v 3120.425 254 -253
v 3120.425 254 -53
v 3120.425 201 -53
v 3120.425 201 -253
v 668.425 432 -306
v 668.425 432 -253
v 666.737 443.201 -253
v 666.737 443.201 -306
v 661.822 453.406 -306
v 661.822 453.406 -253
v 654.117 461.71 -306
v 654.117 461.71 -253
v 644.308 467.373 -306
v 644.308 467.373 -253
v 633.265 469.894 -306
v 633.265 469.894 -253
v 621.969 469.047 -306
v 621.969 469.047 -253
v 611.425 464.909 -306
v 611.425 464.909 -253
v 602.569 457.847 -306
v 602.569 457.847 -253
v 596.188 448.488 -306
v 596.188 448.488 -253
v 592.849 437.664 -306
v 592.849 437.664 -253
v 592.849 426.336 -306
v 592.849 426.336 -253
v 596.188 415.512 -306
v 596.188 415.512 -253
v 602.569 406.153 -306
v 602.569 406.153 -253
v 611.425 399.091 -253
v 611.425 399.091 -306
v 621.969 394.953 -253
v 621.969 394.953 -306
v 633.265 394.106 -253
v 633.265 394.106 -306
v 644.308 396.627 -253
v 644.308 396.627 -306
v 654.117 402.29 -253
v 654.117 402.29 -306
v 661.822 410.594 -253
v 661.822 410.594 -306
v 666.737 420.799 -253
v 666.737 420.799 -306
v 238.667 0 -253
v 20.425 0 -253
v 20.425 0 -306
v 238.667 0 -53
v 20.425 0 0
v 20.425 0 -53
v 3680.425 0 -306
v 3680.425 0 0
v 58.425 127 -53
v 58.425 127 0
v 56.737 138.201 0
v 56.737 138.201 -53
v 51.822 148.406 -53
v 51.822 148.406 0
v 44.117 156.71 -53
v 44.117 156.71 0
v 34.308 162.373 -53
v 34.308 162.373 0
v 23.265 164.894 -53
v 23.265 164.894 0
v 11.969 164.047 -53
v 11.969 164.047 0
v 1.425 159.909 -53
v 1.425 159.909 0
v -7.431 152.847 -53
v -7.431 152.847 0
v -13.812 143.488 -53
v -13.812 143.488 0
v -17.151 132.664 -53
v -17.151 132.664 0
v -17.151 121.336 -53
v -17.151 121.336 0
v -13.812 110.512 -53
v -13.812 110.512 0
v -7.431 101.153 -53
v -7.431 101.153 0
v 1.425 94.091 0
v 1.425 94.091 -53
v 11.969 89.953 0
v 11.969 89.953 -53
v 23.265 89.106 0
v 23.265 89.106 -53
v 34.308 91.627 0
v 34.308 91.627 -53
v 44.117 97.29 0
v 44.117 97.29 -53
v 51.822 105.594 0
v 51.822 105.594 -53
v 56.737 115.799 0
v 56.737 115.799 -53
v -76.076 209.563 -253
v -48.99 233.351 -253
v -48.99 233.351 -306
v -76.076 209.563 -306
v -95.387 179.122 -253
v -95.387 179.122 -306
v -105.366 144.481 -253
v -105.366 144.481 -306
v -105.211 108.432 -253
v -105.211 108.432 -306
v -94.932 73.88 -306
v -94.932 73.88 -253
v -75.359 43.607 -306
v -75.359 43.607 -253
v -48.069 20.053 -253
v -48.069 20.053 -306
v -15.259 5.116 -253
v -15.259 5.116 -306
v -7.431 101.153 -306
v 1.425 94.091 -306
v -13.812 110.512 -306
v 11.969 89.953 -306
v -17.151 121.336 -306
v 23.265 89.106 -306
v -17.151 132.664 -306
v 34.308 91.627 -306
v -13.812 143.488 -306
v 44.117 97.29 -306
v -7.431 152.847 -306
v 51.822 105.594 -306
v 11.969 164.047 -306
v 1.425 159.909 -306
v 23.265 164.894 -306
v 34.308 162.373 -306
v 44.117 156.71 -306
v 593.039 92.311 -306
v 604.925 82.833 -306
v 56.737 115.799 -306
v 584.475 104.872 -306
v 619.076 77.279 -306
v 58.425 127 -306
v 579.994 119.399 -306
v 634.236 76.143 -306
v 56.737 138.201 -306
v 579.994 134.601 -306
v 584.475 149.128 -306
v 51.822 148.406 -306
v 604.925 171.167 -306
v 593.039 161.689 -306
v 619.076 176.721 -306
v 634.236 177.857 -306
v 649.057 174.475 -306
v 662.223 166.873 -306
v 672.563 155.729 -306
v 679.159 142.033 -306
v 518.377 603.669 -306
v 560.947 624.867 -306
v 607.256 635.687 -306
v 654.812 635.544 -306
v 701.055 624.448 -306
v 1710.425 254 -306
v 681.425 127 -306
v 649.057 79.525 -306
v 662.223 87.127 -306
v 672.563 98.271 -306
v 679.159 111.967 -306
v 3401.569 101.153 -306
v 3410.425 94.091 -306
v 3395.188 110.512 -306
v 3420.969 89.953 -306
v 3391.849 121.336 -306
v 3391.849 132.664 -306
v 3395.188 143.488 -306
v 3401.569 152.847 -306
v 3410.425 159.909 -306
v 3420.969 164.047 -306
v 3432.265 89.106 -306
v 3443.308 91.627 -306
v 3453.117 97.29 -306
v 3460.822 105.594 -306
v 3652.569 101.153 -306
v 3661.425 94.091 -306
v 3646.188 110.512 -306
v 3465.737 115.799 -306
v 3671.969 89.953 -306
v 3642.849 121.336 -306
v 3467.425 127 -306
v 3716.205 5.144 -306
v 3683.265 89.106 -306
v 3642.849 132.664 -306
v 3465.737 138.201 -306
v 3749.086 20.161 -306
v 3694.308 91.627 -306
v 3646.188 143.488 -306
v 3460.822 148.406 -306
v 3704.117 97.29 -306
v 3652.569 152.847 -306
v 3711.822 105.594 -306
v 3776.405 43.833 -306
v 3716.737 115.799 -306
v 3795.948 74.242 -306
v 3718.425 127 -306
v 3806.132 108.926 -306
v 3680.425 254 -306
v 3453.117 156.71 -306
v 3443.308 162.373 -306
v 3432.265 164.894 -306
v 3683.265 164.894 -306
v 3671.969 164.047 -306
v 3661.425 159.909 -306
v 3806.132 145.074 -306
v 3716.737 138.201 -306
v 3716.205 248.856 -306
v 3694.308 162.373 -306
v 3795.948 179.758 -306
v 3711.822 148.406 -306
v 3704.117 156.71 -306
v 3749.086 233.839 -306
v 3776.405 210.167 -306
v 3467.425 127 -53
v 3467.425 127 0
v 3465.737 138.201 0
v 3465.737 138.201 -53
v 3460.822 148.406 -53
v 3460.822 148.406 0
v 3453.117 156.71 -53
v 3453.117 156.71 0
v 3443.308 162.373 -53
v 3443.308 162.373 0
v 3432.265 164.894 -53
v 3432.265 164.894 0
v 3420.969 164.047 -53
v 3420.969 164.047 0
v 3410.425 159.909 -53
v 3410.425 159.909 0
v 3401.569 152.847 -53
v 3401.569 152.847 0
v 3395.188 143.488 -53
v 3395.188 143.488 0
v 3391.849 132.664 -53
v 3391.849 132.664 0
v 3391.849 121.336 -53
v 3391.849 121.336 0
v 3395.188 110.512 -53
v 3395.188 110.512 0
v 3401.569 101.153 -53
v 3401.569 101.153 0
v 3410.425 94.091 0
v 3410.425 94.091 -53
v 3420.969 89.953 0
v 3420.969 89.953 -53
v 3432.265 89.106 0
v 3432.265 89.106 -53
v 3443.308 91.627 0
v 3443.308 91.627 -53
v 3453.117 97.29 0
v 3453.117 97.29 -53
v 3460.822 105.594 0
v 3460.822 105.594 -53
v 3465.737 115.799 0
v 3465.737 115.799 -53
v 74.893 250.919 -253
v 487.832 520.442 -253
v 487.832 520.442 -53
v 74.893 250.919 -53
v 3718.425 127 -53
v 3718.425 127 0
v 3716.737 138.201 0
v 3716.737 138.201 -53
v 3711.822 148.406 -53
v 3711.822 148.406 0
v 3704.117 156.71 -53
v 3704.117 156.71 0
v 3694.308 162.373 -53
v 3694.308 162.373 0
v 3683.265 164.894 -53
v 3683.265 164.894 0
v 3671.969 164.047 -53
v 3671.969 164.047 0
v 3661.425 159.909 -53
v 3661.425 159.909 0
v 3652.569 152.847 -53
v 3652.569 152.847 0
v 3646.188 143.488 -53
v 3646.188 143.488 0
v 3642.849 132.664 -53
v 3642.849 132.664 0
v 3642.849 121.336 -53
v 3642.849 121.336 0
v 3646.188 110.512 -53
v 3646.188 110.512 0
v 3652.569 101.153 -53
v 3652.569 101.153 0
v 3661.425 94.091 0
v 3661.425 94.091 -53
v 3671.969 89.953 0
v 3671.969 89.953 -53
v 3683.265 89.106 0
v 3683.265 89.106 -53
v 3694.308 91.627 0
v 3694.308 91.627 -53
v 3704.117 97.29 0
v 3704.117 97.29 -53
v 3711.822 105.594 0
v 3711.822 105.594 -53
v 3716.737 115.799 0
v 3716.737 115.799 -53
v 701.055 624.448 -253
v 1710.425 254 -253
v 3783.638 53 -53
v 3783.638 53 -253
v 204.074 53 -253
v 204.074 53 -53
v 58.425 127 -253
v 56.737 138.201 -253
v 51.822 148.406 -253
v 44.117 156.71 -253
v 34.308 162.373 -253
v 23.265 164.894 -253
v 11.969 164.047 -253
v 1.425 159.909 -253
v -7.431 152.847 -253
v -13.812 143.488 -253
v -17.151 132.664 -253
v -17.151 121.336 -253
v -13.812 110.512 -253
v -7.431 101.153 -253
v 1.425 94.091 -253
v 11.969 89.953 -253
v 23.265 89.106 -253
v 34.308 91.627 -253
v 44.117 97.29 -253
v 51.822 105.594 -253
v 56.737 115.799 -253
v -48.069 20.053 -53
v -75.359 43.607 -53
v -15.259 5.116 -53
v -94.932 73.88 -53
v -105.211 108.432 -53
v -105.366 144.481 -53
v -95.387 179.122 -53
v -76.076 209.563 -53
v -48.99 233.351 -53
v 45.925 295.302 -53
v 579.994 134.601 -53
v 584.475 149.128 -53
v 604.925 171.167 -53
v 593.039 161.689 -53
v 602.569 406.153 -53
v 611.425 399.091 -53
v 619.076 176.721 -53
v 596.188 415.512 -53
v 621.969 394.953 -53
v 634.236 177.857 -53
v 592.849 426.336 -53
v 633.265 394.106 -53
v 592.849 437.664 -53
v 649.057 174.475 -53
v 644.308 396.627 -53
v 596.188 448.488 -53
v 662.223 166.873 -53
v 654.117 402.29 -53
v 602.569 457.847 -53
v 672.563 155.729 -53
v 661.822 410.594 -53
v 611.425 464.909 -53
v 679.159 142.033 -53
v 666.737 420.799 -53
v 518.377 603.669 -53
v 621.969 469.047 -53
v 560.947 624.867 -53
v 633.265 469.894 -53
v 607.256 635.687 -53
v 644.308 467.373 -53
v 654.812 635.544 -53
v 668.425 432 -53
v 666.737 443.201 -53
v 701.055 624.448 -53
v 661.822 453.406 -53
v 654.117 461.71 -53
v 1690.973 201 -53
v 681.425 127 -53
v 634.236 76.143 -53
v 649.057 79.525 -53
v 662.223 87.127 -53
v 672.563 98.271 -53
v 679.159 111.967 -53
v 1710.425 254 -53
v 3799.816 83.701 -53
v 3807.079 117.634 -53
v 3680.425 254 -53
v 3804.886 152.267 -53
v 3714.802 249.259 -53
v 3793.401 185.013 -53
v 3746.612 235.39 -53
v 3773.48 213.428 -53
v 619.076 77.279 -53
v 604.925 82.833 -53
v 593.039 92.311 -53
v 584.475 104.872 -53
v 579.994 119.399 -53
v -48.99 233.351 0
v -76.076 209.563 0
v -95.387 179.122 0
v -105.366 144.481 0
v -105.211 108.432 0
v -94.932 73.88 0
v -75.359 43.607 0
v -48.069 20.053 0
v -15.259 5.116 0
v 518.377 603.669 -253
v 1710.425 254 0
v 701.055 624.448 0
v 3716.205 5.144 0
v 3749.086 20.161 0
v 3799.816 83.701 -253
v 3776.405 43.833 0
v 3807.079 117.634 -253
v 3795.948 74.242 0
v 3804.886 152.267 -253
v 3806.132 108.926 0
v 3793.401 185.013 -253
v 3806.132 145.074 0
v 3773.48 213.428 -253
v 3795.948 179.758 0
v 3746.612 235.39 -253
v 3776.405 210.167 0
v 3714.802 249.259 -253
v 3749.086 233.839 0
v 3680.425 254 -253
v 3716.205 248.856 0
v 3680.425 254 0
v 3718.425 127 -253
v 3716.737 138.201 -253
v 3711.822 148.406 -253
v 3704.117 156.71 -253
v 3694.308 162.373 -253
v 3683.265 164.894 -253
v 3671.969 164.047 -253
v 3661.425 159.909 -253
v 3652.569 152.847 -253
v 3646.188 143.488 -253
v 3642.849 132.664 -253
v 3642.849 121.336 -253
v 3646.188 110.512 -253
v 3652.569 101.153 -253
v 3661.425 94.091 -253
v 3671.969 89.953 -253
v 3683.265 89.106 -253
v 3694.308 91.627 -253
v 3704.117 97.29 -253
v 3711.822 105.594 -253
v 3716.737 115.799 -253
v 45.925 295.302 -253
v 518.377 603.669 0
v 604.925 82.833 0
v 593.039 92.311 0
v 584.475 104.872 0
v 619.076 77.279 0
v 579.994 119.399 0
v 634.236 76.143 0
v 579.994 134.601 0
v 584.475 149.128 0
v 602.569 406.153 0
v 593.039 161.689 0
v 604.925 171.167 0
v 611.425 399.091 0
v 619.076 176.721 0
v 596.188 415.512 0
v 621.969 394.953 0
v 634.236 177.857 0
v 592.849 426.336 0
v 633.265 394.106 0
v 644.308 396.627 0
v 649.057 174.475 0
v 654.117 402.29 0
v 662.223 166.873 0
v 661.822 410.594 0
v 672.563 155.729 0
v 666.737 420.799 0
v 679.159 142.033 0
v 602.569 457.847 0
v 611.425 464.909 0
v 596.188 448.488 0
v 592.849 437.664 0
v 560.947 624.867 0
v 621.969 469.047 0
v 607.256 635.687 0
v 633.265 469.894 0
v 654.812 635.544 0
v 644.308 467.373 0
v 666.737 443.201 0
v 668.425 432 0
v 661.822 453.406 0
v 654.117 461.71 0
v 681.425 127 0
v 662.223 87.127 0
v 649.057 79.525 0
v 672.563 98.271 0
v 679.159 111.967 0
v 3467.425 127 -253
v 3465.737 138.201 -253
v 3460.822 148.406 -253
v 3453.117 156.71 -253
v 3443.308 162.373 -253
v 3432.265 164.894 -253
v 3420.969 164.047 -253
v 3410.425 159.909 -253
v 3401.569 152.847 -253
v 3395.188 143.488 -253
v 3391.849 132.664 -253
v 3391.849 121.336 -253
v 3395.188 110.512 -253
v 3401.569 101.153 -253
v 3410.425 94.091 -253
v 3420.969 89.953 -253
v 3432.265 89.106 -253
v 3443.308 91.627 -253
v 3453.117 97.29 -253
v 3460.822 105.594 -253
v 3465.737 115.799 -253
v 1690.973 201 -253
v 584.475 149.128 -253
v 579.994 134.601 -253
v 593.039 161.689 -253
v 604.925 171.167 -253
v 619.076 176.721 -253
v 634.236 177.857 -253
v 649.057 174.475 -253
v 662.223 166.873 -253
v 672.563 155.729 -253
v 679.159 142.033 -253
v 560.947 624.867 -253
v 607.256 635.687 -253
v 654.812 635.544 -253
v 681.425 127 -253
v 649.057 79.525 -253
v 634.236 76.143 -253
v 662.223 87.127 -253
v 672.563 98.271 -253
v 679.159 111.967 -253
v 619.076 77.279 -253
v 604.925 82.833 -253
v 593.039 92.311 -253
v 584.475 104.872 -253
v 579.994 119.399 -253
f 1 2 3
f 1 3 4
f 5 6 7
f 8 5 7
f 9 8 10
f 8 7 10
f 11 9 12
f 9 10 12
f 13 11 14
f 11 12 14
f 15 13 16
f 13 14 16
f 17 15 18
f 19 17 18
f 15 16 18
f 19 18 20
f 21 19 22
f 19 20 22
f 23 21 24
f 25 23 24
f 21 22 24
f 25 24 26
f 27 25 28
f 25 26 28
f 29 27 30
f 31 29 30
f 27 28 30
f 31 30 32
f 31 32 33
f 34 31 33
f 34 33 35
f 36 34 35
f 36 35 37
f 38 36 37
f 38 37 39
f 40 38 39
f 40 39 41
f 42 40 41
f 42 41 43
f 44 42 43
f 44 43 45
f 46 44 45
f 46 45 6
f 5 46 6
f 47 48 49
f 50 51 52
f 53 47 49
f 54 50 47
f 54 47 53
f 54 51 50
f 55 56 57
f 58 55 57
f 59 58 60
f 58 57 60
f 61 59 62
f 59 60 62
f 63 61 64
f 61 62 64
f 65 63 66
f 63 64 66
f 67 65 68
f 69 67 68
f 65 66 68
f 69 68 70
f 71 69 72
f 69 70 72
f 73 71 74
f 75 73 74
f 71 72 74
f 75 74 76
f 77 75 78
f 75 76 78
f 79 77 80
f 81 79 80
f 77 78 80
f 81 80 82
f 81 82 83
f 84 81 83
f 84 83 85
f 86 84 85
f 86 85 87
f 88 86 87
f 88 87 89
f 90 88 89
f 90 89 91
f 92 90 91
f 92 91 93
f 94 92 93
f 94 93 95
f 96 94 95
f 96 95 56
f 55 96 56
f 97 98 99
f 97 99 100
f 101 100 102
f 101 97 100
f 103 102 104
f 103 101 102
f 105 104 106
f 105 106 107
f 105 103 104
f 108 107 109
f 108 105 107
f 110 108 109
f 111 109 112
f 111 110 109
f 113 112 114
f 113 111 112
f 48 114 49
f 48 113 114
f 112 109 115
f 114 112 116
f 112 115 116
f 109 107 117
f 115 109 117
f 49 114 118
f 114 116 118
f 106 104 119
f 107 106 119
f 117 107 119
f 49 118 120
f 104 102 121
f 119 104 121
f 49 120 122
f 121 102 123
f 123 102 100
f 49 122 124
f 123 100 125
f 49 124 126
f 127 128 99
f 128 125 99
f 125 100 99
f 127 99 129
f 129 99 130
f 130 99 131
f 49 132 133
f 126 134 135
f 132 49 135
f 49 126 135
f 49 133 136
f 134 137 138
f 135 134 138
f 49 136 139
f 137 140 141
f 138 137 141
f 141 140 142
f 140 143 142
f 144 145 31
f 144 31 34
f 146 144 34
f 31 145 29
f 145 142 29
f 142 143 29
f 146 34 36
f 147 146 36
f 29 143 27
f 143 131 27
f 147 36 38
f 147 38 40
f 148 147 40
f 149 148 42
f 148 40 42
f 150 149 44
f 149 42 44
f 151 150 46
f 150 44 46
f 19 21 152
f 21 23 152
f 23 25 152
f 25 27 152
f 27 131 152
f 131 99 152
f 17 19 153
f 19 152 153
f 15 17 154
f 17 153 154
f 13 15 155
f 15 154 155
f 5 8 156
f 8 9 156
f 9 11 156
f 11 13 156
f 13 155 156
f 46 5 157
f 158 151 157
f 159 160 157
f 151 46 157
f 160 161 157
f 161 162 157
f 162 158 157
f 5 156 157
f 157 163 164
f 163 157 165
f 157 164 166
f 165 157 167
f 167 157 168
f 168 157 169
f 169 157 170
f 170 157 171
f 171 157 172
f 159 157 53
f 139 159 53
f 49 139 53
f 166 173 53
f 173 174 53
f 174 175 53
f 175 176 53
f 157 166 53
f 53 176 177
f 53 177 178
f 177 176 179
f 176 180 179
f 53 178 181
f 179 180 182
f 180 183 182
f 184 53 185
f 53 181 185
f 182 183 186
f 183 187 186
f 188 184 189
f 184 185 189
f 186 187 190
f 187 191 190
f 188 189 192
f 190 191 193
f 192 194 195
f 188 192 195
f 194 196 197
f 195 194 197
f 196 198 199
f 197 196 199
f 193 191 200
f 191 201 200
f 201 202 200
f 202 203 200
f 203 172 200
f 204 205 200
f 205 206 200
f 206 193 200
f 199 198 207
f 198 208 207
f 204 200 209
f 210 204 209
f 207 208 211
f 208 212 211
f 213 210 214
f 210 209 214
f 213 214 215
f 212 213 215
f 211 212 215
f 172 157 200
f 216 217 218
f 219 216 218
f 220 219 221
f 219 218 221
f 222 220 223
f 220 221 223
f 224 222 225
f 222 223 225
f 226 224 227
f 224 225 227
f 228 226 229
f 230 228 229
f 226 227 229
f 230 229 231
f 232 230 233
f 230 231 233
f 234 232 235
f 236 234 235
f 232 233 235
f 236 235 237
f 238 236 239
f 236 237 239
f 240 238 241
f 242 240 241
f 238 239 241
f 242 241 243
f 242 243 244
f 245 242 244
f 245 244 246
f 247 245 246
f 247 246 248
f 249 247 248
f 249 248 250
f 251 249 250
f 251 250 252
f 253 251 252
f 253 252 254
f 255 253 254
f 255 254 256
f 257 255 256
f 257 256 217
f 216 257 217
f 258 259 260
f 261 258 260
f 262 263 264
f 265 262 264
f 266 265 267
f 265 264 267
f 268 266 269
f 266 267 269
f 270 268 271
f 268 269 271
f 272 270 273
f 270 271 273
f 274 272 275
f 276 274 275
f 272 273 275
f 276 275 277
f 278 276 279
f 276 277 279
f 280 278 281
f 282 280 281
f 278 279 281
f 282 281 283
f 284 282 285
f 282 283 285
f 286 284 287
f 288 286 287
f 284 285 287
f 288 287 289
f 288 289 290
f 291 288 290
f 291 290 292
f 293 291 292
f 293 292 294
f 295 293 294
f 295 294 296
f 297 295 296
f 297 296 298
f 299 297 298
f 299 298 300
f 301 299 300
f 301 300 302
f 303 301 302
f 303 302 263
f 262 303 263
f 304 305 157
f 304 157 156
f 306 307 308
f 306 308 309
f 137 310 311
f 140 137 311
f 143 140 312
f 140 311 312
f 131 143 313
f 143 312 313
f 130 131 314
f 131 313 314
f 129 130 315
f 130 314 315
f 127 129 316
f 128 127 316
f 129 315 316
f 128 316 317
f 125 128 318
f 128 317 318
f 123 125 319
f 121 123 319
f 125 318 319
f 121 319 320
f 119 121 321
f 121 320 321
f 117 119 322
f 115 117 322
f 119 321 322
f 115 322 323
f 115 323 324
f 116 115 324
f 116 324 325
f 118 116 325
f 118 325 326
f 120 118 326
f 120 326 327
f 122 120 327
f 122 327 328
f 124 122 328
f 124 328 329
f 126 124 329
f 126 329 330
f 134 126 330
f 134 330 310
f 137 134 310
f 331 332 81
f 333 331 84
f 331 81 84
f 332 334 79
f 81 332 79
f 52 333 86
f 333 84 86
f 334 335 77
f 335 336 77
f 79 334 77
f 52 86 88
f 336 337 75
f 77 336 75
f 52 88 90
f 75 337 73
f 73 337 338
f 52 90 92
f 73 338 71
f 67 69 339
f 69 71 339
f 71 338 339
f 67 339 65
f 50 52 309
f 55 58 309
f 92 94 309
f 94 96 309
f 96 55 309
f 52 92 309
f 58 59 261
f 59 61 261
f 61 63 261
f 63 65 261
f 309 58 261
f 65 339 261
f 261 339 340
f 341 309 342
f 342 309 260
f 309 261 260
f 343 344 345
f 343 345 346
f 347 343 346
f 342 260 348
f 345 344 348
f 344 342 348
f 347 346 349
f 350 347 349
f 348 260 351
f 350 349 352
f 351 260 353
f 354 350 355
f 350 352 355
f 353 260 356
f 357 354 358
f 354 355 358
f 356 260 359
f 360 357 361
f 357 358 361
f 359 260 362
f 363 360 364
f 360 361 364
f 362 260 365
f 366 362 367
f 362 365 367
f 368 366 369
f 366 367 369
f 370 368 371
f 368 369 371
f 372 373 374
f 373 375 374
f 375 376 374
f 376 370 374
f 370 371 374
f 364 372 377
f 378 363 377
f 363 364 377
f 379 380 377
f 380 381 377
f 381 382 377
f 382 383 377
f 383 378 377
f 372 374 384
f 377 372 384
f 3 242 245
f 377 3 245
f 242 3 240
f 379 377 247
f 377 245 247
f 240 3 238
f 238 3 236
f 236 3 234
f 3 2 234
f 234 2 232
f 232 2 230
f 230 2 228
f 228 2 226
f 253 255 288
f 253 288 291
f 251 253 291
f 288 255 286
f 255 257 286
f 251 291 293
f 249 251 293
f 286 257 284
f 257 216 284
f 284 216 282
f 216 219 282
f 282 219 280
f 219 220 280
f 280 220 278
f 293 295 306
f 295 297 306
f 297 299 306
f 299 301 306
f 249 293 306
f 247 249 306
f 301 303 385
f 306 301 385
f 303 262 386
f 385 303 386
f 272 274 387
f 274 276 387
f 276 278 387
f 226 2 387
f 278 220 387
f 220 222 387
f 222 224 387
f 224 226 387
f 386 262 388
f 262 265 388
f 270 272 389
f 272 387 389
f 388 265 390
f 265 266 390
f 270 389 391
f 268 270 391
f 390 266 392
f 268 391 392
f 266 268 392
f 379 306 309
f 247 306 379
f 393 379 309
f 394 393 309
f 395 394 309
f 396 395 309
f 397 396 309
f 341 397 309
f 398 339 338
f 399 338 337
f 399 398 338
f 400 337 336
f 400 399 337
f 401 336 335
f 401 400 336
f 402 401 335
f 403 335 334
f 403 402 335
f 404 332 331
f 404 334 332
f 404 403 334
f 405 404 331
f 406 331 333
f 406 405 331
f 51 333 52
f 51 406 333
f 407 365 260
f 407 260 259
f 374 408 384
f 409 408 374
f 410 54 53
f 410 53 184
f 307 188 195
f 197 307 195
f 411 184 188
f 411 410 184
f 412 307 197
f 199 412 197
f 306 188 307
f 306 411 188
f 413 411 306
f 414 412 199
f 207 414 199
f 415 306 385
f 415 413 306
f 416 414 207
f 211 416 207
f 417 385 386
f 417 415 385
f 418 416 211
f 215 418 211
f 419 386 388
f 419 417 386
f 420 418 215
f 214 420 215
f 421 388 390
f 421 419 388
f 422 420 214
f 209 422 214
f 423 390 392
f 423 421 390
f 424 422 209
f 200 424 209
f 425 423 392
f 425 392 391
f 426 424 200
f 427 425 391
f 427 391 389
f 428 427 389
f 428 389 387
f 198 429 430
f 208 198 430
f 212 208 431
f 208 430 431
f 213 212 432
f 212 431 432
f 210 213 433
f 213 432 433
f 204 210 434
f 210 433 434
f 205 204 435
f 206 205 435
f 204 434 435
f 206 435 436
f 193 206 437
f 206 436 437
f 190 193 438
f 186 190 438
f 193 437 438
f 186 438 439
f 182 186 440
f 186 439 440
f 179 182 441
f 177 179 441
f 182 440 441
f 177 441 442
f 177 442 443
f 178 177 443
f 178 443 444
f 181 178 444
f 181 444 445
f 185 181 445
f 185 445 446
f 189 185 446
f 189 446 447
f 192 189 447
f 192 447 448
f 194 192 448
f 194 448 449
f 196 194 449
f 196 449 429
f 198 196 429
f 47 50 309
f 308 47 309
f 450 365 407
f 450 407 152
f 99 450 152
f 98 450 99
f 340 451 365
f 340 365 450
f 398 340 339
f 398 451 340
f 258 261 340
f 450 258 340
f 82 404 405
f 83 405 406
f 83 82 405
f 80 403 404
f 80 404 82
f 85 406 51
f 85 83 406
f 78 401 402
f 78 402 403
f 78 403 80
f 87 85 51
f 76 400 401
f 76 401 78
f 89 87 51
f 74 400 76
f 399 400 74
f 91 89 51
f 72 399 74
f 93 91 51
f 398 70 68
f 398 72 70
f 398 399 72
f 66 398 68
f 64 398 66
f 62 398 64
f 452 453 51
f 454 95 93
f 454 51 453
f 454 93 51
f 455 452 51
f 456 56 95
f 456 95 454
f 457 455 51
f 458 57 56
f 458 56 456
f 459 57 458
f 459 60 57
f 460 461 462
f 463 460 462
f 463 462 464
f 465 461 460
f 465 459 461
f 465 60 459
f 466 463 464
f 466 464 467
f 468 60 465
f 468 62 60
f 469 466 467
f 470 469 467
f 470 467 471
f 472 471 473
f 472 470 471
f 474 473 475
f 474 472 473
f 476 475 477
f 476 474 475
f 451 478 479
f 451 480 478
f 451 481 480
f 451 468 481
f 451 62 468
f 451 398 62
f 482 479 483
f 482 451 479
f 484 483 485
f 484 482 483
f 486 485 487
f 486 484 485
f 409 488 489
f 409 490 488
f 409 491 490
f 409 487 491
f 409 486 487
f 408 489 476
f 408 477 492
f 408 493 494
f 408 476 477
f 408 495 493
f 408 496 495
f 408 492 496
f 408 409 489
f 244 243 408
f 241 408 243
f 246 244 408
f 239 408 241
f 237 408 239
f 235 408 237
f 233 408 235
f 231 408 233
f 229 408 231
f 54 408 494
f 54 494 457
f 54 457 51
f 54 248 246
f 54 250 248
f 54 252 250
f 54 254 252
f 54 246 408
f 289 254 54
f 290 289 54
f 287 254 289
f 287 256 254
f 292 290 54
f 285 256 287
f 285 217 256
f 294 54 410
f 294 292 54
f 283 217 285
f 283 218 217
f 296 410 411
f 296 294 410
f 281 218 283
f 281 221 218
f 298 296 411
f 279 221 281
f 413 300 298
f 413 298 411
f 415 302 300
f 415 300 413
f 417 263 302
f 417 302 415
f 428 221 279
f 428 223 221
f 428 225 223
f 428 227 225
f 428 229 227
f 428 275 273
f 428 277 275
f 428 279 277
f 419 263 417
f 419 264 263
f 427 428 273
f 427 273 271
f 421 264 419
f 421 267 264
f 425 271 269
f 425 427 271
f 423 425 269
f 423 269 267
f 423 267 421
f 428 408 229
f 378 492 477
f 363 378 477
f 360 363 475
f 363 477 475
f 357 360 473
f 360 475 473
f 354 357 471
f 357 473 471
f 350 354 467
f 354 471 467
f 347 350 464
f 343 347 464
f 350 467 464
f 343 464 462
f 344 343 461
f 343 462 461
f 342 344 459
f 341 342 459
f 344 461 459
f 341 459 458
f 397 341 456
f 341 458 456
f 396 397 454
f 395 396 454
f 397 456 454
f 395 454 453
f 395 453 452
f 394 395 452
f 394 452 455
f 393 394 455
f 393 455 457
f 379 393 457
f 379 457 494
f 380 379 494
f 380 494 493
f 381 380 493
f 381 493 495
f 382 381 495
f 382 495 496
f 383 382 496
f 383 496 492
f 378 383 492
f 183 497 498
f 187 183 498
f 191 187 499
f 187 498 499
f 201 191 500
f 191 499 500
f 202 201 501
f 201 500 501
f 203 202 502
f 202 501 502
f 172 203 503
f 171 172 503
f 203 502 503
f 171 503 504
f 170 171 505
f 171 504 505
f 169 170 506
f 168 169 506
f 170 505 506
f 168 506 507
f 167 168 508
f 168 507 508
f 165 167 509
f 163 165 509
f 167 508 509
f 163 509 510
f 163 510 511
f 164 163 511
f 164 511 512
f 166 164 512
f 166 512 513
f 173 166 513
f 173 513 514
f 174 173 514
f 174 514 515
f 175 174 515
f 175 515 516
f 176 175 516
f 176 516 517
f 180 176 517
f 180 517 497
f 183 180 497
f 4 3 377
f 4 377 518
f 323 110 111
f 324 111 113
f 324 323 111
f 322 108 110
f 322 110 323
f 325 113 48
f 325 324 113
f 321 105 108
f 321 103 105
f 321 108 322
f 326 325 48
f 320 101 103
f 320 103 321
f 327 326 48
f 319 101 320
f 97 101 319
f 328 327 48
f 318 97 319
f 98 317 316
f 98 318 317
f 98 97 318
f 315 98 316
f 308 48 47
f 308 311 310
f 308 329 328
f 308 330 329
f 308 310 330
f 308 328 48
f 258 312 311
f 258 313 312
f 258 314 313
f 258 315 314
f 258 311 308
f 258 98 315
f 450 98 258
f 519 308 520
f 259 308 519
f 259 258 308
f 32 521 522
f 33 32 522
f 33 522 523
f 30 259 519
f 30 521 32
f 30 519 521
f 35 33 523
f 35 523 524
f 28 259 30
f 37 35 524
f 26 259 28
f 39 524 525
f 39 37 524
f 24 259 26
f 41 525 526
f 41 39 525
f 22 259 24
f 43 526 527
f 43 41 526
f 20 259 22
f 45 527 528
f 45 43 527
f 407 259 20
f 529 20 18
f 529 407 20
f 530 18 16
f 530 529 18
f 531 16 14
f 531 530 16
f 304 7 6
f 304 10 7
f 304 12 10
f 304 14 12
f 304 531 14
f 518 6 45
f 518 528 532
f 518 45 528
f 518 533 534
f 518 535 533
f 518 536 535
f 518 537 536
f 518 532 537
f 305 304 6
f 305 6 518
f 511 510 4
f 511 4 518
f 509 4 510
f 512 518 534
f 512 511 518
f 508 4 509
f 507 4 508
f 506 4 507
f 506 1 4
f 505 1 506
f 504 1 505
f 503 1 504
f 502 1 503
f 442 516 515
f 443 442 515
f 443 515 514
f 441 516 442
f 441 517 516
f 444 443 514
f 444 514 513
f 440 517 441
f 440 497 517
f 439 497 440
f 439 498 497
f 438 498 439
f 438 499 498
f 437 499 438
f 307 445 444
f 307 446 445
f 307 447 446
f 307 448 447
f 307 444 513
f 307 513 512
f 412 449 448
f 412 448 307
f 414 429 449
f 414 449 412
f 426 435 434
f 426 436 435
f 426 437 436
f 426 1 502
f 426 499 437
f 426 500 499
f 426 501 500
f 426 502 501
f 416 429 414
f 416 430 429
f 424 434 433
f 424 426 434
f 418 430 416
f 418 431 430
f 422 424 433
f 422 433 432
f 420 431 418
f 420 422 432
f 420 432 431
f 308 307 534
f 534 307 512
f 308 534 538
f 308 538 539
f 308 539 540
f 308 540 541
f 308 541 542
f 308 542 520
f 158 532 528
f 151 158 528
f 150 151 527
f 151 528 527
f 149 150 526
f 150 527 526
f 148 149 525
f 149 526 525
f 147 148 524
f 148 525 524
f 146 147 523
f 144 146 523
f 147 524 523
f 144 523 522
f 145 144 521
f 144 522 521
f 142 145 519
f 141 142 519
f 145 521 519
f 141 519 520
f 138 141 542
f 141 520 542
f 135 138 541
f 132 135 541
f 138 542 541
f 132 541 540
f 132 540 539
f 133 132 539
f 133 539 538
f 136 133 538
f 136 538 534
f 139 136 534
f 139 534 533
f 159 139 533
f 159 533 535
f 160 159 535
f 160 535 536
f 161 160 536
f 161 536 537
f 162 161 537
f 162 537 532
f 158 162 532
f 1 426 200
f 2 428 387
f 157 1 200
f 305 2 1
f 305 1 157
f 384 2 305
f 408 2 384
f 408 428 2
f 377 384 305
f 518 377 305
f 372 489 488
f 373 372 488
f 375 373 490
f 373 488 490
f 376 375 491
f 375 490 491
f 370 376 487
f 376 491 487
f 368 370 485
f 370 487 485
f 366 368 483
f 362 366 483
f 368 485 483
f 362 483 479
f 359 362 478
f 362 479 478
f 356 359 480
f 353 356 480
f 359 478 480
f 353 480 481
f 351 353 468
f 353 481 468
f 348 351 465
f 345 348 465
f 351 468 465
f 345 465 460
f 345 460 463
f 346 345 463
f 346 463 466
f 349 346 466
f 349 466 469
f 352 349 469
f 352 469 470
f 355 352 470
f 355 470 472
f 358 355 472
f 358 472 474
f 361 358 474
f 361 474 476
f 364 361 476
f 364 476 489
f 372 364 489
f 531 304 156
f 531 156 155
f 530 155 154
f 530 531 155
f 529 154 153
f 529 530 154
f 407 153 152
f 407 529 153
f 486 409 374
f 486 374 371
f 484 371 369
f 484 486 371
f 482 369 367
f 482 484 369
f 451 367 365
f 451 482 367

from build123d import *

# Parameters (mm, degrees)
SKETCH1_R           = 38
SKETCH1_R_2         = 51
BOSS_EXTRUDE1_DEPTH = 306
SKETCH8_W           = 1075.201841516
SKETCH8_H           = 200
SKETCH8_W_2         = 164.33390396
CUT_EXTRUDE5_DEPTH  = 3620.888611426
SKETCH2_W           = 560
SKETCH2_H           = 200
SKETCH2_W_2         = 127
CUT_EXTRUDE10_DEPTH = 201
SKETCH15_W          = 200
SKETCH15_H          = 148
CUT_EXTRUDE11_DEPTH = 3304.473020928
CUT_EXTRUDE12_START = -53
SKETCH16_R          = 38
CUT_EXTRUDE12_DEPTH = 200
SKETCH18_W          = 200
SKETCH18_H          = 203.424864611
CUT_EXTRUDE13_DEPTH = 3691.825090025


with BuildPart() as part:
    # Sketch1 → Boss-Extrude1 (new body)
    with BuildSketch(Plane.XY):
        with BuildLine():
            Line((20.424857609, 0), (3680.424857609, 0))
            ThreePointArc((3680.424857609, 0), (3807.424857609, 127), (3680.424857609, 254))
            Line((3680.424857609, 254), (1710.424857609, 254))
            Line((1710.424857609, 254), (701.055226762, 624.448307224))
            ThreePointArc((701.055226762, 624.448307224), (607.25608652, 635.686543606), (518.377147917, 603.669189876))
            Line((518.377147917, 603.669189876), (-48.990064981, 233.351156655))
            ThreePointArc((-48.990064981, 233.351156655), (-101.303522186, 90.789482848), (20.424857609, 0))
        make_face()
        with Locations((20.424857609, 127)):
            Circle(SKETCH1_R, mode=Mode.SUBTRACT)
        with Locations((630.424857609, 127)):
            Circle(SKETCH1_R_2, mode=Mode.SUBTRACT)
        with Locations((630.424857609, 432)):
            Circle(SKETCH1_R, mode=Mode.SUBTRACT)
        with Locations((3680.424857609, 127)):
            Circle(SKETCH1_R, mode=Mode.SUBTRACT)
        with Locations((3429.424857609, 127)):
            Circle(SKETCH1_R, mode=Mode.SUBTRACT)
    extrude(amount=-BOSS_EXTRUDE1_DEPTH)

    # Sketch8 → Cut-Extrude5 (cut, through all)
    with BuildSketch(Plane(origin=(285.193429172, 777.073563867, 0), x_dir=(0.9387722303591257, -0.3445383861147445, 0), z_dir=(0.3445383861147445, 0.9387722303591257, 0))):
        with Locations((980.585687608, 153)):
            Rectangle(SKETCH8_W, SKETCH8_H)
        with Locations((360.81781487, 153)):
            Rectangle(SKETCH8_W_2, SKETCH8_H)
    extrude(amount=-CUT_EXTRUDE5_DEPTH, mode=Mode.SUBTRACT)

    # Sketch2 → Cut-Extrude10 (cut)
    with BuildSketch(Plane(origin=(0, 254, 0), x_dir=(1, 0, 0), z_dir=(0, 1, 0))):
        with Locations((3400.424857609, 153)):
            Rectangle(SKETCH2_W, SKETCH2_H)
        with Locations((3743.924857609, 153)):
            Rectangle(SKETCH2_W_2, SKETCH2_H)
    extrude(amount=-CUT_EXTRUDE10_DEPTH, mode=Mode.SUBTRACT)

    # Sketch15 → Cut-Extrude11 (cut, through all)
    with BuildSketch(Plane(origin=(3120.424857609, 0, 0), x_dir=(0, 0, -1), z_dir=(1, 0, 0))):
        with Locations((153, 127)):
            Rectangle(SKETCH15_W, SKETCH15_H)
    extrude(amount=-CUT_EXTRUDE11_DEPTH, mode=Mode.SUBTRACT)

    # Sketch16 → Cut-Extrude12 (cut)
    with BuildSketch(Plane.XY.offset(CUT_EXTRUDE12_START)):
        with BuildLine():
            Line((45.924857609, 295.301700602), (-48.990064981, 233.351156655))
            ThreePointArc((-48.990064981, 233.351156655), (-101.303522186, 90.789482848), (20.424857609, 0))
            Line((20.424857609, 0), (238.666952125, 0))
            Line((238.666952125, 0), (45.924857609, 295.301700602))
        make_face()
        with Locations((20.424857609, 127)):
            Circle(SKETCH16_R, mode=Mode.SUBTRACT)
    extrude(amount=-CUT_EXTRUDE12_DEPTH, mode=Mode.SUBTRACT)

    # Sketch18 → Cut-Extrude13 (cut, through all)
    with BuildSketch(Plane(origin=(167.36678752, 109.239550986, 0), x_dir=(0, 0, 1), z_dir=(-0.8374106823227343, -0.5465741936203838, 0))):
        with Locations((-153, 67.475024273)):
            Rectangle(SKETCH18_W, SKETCH18_H)
    extrude(amount=-CUT_EXTRUDE13_DEPTH, mode=Mode.SUBTRACT)

    # loft from a face of the part (loft7)
    loft([part.faces().sort_by_distance((1626.930182004, 26.5, -153))[0], part.faces().sort_by_distance((306.550535705, 26.5, -153))[0]])


solid = part.part
